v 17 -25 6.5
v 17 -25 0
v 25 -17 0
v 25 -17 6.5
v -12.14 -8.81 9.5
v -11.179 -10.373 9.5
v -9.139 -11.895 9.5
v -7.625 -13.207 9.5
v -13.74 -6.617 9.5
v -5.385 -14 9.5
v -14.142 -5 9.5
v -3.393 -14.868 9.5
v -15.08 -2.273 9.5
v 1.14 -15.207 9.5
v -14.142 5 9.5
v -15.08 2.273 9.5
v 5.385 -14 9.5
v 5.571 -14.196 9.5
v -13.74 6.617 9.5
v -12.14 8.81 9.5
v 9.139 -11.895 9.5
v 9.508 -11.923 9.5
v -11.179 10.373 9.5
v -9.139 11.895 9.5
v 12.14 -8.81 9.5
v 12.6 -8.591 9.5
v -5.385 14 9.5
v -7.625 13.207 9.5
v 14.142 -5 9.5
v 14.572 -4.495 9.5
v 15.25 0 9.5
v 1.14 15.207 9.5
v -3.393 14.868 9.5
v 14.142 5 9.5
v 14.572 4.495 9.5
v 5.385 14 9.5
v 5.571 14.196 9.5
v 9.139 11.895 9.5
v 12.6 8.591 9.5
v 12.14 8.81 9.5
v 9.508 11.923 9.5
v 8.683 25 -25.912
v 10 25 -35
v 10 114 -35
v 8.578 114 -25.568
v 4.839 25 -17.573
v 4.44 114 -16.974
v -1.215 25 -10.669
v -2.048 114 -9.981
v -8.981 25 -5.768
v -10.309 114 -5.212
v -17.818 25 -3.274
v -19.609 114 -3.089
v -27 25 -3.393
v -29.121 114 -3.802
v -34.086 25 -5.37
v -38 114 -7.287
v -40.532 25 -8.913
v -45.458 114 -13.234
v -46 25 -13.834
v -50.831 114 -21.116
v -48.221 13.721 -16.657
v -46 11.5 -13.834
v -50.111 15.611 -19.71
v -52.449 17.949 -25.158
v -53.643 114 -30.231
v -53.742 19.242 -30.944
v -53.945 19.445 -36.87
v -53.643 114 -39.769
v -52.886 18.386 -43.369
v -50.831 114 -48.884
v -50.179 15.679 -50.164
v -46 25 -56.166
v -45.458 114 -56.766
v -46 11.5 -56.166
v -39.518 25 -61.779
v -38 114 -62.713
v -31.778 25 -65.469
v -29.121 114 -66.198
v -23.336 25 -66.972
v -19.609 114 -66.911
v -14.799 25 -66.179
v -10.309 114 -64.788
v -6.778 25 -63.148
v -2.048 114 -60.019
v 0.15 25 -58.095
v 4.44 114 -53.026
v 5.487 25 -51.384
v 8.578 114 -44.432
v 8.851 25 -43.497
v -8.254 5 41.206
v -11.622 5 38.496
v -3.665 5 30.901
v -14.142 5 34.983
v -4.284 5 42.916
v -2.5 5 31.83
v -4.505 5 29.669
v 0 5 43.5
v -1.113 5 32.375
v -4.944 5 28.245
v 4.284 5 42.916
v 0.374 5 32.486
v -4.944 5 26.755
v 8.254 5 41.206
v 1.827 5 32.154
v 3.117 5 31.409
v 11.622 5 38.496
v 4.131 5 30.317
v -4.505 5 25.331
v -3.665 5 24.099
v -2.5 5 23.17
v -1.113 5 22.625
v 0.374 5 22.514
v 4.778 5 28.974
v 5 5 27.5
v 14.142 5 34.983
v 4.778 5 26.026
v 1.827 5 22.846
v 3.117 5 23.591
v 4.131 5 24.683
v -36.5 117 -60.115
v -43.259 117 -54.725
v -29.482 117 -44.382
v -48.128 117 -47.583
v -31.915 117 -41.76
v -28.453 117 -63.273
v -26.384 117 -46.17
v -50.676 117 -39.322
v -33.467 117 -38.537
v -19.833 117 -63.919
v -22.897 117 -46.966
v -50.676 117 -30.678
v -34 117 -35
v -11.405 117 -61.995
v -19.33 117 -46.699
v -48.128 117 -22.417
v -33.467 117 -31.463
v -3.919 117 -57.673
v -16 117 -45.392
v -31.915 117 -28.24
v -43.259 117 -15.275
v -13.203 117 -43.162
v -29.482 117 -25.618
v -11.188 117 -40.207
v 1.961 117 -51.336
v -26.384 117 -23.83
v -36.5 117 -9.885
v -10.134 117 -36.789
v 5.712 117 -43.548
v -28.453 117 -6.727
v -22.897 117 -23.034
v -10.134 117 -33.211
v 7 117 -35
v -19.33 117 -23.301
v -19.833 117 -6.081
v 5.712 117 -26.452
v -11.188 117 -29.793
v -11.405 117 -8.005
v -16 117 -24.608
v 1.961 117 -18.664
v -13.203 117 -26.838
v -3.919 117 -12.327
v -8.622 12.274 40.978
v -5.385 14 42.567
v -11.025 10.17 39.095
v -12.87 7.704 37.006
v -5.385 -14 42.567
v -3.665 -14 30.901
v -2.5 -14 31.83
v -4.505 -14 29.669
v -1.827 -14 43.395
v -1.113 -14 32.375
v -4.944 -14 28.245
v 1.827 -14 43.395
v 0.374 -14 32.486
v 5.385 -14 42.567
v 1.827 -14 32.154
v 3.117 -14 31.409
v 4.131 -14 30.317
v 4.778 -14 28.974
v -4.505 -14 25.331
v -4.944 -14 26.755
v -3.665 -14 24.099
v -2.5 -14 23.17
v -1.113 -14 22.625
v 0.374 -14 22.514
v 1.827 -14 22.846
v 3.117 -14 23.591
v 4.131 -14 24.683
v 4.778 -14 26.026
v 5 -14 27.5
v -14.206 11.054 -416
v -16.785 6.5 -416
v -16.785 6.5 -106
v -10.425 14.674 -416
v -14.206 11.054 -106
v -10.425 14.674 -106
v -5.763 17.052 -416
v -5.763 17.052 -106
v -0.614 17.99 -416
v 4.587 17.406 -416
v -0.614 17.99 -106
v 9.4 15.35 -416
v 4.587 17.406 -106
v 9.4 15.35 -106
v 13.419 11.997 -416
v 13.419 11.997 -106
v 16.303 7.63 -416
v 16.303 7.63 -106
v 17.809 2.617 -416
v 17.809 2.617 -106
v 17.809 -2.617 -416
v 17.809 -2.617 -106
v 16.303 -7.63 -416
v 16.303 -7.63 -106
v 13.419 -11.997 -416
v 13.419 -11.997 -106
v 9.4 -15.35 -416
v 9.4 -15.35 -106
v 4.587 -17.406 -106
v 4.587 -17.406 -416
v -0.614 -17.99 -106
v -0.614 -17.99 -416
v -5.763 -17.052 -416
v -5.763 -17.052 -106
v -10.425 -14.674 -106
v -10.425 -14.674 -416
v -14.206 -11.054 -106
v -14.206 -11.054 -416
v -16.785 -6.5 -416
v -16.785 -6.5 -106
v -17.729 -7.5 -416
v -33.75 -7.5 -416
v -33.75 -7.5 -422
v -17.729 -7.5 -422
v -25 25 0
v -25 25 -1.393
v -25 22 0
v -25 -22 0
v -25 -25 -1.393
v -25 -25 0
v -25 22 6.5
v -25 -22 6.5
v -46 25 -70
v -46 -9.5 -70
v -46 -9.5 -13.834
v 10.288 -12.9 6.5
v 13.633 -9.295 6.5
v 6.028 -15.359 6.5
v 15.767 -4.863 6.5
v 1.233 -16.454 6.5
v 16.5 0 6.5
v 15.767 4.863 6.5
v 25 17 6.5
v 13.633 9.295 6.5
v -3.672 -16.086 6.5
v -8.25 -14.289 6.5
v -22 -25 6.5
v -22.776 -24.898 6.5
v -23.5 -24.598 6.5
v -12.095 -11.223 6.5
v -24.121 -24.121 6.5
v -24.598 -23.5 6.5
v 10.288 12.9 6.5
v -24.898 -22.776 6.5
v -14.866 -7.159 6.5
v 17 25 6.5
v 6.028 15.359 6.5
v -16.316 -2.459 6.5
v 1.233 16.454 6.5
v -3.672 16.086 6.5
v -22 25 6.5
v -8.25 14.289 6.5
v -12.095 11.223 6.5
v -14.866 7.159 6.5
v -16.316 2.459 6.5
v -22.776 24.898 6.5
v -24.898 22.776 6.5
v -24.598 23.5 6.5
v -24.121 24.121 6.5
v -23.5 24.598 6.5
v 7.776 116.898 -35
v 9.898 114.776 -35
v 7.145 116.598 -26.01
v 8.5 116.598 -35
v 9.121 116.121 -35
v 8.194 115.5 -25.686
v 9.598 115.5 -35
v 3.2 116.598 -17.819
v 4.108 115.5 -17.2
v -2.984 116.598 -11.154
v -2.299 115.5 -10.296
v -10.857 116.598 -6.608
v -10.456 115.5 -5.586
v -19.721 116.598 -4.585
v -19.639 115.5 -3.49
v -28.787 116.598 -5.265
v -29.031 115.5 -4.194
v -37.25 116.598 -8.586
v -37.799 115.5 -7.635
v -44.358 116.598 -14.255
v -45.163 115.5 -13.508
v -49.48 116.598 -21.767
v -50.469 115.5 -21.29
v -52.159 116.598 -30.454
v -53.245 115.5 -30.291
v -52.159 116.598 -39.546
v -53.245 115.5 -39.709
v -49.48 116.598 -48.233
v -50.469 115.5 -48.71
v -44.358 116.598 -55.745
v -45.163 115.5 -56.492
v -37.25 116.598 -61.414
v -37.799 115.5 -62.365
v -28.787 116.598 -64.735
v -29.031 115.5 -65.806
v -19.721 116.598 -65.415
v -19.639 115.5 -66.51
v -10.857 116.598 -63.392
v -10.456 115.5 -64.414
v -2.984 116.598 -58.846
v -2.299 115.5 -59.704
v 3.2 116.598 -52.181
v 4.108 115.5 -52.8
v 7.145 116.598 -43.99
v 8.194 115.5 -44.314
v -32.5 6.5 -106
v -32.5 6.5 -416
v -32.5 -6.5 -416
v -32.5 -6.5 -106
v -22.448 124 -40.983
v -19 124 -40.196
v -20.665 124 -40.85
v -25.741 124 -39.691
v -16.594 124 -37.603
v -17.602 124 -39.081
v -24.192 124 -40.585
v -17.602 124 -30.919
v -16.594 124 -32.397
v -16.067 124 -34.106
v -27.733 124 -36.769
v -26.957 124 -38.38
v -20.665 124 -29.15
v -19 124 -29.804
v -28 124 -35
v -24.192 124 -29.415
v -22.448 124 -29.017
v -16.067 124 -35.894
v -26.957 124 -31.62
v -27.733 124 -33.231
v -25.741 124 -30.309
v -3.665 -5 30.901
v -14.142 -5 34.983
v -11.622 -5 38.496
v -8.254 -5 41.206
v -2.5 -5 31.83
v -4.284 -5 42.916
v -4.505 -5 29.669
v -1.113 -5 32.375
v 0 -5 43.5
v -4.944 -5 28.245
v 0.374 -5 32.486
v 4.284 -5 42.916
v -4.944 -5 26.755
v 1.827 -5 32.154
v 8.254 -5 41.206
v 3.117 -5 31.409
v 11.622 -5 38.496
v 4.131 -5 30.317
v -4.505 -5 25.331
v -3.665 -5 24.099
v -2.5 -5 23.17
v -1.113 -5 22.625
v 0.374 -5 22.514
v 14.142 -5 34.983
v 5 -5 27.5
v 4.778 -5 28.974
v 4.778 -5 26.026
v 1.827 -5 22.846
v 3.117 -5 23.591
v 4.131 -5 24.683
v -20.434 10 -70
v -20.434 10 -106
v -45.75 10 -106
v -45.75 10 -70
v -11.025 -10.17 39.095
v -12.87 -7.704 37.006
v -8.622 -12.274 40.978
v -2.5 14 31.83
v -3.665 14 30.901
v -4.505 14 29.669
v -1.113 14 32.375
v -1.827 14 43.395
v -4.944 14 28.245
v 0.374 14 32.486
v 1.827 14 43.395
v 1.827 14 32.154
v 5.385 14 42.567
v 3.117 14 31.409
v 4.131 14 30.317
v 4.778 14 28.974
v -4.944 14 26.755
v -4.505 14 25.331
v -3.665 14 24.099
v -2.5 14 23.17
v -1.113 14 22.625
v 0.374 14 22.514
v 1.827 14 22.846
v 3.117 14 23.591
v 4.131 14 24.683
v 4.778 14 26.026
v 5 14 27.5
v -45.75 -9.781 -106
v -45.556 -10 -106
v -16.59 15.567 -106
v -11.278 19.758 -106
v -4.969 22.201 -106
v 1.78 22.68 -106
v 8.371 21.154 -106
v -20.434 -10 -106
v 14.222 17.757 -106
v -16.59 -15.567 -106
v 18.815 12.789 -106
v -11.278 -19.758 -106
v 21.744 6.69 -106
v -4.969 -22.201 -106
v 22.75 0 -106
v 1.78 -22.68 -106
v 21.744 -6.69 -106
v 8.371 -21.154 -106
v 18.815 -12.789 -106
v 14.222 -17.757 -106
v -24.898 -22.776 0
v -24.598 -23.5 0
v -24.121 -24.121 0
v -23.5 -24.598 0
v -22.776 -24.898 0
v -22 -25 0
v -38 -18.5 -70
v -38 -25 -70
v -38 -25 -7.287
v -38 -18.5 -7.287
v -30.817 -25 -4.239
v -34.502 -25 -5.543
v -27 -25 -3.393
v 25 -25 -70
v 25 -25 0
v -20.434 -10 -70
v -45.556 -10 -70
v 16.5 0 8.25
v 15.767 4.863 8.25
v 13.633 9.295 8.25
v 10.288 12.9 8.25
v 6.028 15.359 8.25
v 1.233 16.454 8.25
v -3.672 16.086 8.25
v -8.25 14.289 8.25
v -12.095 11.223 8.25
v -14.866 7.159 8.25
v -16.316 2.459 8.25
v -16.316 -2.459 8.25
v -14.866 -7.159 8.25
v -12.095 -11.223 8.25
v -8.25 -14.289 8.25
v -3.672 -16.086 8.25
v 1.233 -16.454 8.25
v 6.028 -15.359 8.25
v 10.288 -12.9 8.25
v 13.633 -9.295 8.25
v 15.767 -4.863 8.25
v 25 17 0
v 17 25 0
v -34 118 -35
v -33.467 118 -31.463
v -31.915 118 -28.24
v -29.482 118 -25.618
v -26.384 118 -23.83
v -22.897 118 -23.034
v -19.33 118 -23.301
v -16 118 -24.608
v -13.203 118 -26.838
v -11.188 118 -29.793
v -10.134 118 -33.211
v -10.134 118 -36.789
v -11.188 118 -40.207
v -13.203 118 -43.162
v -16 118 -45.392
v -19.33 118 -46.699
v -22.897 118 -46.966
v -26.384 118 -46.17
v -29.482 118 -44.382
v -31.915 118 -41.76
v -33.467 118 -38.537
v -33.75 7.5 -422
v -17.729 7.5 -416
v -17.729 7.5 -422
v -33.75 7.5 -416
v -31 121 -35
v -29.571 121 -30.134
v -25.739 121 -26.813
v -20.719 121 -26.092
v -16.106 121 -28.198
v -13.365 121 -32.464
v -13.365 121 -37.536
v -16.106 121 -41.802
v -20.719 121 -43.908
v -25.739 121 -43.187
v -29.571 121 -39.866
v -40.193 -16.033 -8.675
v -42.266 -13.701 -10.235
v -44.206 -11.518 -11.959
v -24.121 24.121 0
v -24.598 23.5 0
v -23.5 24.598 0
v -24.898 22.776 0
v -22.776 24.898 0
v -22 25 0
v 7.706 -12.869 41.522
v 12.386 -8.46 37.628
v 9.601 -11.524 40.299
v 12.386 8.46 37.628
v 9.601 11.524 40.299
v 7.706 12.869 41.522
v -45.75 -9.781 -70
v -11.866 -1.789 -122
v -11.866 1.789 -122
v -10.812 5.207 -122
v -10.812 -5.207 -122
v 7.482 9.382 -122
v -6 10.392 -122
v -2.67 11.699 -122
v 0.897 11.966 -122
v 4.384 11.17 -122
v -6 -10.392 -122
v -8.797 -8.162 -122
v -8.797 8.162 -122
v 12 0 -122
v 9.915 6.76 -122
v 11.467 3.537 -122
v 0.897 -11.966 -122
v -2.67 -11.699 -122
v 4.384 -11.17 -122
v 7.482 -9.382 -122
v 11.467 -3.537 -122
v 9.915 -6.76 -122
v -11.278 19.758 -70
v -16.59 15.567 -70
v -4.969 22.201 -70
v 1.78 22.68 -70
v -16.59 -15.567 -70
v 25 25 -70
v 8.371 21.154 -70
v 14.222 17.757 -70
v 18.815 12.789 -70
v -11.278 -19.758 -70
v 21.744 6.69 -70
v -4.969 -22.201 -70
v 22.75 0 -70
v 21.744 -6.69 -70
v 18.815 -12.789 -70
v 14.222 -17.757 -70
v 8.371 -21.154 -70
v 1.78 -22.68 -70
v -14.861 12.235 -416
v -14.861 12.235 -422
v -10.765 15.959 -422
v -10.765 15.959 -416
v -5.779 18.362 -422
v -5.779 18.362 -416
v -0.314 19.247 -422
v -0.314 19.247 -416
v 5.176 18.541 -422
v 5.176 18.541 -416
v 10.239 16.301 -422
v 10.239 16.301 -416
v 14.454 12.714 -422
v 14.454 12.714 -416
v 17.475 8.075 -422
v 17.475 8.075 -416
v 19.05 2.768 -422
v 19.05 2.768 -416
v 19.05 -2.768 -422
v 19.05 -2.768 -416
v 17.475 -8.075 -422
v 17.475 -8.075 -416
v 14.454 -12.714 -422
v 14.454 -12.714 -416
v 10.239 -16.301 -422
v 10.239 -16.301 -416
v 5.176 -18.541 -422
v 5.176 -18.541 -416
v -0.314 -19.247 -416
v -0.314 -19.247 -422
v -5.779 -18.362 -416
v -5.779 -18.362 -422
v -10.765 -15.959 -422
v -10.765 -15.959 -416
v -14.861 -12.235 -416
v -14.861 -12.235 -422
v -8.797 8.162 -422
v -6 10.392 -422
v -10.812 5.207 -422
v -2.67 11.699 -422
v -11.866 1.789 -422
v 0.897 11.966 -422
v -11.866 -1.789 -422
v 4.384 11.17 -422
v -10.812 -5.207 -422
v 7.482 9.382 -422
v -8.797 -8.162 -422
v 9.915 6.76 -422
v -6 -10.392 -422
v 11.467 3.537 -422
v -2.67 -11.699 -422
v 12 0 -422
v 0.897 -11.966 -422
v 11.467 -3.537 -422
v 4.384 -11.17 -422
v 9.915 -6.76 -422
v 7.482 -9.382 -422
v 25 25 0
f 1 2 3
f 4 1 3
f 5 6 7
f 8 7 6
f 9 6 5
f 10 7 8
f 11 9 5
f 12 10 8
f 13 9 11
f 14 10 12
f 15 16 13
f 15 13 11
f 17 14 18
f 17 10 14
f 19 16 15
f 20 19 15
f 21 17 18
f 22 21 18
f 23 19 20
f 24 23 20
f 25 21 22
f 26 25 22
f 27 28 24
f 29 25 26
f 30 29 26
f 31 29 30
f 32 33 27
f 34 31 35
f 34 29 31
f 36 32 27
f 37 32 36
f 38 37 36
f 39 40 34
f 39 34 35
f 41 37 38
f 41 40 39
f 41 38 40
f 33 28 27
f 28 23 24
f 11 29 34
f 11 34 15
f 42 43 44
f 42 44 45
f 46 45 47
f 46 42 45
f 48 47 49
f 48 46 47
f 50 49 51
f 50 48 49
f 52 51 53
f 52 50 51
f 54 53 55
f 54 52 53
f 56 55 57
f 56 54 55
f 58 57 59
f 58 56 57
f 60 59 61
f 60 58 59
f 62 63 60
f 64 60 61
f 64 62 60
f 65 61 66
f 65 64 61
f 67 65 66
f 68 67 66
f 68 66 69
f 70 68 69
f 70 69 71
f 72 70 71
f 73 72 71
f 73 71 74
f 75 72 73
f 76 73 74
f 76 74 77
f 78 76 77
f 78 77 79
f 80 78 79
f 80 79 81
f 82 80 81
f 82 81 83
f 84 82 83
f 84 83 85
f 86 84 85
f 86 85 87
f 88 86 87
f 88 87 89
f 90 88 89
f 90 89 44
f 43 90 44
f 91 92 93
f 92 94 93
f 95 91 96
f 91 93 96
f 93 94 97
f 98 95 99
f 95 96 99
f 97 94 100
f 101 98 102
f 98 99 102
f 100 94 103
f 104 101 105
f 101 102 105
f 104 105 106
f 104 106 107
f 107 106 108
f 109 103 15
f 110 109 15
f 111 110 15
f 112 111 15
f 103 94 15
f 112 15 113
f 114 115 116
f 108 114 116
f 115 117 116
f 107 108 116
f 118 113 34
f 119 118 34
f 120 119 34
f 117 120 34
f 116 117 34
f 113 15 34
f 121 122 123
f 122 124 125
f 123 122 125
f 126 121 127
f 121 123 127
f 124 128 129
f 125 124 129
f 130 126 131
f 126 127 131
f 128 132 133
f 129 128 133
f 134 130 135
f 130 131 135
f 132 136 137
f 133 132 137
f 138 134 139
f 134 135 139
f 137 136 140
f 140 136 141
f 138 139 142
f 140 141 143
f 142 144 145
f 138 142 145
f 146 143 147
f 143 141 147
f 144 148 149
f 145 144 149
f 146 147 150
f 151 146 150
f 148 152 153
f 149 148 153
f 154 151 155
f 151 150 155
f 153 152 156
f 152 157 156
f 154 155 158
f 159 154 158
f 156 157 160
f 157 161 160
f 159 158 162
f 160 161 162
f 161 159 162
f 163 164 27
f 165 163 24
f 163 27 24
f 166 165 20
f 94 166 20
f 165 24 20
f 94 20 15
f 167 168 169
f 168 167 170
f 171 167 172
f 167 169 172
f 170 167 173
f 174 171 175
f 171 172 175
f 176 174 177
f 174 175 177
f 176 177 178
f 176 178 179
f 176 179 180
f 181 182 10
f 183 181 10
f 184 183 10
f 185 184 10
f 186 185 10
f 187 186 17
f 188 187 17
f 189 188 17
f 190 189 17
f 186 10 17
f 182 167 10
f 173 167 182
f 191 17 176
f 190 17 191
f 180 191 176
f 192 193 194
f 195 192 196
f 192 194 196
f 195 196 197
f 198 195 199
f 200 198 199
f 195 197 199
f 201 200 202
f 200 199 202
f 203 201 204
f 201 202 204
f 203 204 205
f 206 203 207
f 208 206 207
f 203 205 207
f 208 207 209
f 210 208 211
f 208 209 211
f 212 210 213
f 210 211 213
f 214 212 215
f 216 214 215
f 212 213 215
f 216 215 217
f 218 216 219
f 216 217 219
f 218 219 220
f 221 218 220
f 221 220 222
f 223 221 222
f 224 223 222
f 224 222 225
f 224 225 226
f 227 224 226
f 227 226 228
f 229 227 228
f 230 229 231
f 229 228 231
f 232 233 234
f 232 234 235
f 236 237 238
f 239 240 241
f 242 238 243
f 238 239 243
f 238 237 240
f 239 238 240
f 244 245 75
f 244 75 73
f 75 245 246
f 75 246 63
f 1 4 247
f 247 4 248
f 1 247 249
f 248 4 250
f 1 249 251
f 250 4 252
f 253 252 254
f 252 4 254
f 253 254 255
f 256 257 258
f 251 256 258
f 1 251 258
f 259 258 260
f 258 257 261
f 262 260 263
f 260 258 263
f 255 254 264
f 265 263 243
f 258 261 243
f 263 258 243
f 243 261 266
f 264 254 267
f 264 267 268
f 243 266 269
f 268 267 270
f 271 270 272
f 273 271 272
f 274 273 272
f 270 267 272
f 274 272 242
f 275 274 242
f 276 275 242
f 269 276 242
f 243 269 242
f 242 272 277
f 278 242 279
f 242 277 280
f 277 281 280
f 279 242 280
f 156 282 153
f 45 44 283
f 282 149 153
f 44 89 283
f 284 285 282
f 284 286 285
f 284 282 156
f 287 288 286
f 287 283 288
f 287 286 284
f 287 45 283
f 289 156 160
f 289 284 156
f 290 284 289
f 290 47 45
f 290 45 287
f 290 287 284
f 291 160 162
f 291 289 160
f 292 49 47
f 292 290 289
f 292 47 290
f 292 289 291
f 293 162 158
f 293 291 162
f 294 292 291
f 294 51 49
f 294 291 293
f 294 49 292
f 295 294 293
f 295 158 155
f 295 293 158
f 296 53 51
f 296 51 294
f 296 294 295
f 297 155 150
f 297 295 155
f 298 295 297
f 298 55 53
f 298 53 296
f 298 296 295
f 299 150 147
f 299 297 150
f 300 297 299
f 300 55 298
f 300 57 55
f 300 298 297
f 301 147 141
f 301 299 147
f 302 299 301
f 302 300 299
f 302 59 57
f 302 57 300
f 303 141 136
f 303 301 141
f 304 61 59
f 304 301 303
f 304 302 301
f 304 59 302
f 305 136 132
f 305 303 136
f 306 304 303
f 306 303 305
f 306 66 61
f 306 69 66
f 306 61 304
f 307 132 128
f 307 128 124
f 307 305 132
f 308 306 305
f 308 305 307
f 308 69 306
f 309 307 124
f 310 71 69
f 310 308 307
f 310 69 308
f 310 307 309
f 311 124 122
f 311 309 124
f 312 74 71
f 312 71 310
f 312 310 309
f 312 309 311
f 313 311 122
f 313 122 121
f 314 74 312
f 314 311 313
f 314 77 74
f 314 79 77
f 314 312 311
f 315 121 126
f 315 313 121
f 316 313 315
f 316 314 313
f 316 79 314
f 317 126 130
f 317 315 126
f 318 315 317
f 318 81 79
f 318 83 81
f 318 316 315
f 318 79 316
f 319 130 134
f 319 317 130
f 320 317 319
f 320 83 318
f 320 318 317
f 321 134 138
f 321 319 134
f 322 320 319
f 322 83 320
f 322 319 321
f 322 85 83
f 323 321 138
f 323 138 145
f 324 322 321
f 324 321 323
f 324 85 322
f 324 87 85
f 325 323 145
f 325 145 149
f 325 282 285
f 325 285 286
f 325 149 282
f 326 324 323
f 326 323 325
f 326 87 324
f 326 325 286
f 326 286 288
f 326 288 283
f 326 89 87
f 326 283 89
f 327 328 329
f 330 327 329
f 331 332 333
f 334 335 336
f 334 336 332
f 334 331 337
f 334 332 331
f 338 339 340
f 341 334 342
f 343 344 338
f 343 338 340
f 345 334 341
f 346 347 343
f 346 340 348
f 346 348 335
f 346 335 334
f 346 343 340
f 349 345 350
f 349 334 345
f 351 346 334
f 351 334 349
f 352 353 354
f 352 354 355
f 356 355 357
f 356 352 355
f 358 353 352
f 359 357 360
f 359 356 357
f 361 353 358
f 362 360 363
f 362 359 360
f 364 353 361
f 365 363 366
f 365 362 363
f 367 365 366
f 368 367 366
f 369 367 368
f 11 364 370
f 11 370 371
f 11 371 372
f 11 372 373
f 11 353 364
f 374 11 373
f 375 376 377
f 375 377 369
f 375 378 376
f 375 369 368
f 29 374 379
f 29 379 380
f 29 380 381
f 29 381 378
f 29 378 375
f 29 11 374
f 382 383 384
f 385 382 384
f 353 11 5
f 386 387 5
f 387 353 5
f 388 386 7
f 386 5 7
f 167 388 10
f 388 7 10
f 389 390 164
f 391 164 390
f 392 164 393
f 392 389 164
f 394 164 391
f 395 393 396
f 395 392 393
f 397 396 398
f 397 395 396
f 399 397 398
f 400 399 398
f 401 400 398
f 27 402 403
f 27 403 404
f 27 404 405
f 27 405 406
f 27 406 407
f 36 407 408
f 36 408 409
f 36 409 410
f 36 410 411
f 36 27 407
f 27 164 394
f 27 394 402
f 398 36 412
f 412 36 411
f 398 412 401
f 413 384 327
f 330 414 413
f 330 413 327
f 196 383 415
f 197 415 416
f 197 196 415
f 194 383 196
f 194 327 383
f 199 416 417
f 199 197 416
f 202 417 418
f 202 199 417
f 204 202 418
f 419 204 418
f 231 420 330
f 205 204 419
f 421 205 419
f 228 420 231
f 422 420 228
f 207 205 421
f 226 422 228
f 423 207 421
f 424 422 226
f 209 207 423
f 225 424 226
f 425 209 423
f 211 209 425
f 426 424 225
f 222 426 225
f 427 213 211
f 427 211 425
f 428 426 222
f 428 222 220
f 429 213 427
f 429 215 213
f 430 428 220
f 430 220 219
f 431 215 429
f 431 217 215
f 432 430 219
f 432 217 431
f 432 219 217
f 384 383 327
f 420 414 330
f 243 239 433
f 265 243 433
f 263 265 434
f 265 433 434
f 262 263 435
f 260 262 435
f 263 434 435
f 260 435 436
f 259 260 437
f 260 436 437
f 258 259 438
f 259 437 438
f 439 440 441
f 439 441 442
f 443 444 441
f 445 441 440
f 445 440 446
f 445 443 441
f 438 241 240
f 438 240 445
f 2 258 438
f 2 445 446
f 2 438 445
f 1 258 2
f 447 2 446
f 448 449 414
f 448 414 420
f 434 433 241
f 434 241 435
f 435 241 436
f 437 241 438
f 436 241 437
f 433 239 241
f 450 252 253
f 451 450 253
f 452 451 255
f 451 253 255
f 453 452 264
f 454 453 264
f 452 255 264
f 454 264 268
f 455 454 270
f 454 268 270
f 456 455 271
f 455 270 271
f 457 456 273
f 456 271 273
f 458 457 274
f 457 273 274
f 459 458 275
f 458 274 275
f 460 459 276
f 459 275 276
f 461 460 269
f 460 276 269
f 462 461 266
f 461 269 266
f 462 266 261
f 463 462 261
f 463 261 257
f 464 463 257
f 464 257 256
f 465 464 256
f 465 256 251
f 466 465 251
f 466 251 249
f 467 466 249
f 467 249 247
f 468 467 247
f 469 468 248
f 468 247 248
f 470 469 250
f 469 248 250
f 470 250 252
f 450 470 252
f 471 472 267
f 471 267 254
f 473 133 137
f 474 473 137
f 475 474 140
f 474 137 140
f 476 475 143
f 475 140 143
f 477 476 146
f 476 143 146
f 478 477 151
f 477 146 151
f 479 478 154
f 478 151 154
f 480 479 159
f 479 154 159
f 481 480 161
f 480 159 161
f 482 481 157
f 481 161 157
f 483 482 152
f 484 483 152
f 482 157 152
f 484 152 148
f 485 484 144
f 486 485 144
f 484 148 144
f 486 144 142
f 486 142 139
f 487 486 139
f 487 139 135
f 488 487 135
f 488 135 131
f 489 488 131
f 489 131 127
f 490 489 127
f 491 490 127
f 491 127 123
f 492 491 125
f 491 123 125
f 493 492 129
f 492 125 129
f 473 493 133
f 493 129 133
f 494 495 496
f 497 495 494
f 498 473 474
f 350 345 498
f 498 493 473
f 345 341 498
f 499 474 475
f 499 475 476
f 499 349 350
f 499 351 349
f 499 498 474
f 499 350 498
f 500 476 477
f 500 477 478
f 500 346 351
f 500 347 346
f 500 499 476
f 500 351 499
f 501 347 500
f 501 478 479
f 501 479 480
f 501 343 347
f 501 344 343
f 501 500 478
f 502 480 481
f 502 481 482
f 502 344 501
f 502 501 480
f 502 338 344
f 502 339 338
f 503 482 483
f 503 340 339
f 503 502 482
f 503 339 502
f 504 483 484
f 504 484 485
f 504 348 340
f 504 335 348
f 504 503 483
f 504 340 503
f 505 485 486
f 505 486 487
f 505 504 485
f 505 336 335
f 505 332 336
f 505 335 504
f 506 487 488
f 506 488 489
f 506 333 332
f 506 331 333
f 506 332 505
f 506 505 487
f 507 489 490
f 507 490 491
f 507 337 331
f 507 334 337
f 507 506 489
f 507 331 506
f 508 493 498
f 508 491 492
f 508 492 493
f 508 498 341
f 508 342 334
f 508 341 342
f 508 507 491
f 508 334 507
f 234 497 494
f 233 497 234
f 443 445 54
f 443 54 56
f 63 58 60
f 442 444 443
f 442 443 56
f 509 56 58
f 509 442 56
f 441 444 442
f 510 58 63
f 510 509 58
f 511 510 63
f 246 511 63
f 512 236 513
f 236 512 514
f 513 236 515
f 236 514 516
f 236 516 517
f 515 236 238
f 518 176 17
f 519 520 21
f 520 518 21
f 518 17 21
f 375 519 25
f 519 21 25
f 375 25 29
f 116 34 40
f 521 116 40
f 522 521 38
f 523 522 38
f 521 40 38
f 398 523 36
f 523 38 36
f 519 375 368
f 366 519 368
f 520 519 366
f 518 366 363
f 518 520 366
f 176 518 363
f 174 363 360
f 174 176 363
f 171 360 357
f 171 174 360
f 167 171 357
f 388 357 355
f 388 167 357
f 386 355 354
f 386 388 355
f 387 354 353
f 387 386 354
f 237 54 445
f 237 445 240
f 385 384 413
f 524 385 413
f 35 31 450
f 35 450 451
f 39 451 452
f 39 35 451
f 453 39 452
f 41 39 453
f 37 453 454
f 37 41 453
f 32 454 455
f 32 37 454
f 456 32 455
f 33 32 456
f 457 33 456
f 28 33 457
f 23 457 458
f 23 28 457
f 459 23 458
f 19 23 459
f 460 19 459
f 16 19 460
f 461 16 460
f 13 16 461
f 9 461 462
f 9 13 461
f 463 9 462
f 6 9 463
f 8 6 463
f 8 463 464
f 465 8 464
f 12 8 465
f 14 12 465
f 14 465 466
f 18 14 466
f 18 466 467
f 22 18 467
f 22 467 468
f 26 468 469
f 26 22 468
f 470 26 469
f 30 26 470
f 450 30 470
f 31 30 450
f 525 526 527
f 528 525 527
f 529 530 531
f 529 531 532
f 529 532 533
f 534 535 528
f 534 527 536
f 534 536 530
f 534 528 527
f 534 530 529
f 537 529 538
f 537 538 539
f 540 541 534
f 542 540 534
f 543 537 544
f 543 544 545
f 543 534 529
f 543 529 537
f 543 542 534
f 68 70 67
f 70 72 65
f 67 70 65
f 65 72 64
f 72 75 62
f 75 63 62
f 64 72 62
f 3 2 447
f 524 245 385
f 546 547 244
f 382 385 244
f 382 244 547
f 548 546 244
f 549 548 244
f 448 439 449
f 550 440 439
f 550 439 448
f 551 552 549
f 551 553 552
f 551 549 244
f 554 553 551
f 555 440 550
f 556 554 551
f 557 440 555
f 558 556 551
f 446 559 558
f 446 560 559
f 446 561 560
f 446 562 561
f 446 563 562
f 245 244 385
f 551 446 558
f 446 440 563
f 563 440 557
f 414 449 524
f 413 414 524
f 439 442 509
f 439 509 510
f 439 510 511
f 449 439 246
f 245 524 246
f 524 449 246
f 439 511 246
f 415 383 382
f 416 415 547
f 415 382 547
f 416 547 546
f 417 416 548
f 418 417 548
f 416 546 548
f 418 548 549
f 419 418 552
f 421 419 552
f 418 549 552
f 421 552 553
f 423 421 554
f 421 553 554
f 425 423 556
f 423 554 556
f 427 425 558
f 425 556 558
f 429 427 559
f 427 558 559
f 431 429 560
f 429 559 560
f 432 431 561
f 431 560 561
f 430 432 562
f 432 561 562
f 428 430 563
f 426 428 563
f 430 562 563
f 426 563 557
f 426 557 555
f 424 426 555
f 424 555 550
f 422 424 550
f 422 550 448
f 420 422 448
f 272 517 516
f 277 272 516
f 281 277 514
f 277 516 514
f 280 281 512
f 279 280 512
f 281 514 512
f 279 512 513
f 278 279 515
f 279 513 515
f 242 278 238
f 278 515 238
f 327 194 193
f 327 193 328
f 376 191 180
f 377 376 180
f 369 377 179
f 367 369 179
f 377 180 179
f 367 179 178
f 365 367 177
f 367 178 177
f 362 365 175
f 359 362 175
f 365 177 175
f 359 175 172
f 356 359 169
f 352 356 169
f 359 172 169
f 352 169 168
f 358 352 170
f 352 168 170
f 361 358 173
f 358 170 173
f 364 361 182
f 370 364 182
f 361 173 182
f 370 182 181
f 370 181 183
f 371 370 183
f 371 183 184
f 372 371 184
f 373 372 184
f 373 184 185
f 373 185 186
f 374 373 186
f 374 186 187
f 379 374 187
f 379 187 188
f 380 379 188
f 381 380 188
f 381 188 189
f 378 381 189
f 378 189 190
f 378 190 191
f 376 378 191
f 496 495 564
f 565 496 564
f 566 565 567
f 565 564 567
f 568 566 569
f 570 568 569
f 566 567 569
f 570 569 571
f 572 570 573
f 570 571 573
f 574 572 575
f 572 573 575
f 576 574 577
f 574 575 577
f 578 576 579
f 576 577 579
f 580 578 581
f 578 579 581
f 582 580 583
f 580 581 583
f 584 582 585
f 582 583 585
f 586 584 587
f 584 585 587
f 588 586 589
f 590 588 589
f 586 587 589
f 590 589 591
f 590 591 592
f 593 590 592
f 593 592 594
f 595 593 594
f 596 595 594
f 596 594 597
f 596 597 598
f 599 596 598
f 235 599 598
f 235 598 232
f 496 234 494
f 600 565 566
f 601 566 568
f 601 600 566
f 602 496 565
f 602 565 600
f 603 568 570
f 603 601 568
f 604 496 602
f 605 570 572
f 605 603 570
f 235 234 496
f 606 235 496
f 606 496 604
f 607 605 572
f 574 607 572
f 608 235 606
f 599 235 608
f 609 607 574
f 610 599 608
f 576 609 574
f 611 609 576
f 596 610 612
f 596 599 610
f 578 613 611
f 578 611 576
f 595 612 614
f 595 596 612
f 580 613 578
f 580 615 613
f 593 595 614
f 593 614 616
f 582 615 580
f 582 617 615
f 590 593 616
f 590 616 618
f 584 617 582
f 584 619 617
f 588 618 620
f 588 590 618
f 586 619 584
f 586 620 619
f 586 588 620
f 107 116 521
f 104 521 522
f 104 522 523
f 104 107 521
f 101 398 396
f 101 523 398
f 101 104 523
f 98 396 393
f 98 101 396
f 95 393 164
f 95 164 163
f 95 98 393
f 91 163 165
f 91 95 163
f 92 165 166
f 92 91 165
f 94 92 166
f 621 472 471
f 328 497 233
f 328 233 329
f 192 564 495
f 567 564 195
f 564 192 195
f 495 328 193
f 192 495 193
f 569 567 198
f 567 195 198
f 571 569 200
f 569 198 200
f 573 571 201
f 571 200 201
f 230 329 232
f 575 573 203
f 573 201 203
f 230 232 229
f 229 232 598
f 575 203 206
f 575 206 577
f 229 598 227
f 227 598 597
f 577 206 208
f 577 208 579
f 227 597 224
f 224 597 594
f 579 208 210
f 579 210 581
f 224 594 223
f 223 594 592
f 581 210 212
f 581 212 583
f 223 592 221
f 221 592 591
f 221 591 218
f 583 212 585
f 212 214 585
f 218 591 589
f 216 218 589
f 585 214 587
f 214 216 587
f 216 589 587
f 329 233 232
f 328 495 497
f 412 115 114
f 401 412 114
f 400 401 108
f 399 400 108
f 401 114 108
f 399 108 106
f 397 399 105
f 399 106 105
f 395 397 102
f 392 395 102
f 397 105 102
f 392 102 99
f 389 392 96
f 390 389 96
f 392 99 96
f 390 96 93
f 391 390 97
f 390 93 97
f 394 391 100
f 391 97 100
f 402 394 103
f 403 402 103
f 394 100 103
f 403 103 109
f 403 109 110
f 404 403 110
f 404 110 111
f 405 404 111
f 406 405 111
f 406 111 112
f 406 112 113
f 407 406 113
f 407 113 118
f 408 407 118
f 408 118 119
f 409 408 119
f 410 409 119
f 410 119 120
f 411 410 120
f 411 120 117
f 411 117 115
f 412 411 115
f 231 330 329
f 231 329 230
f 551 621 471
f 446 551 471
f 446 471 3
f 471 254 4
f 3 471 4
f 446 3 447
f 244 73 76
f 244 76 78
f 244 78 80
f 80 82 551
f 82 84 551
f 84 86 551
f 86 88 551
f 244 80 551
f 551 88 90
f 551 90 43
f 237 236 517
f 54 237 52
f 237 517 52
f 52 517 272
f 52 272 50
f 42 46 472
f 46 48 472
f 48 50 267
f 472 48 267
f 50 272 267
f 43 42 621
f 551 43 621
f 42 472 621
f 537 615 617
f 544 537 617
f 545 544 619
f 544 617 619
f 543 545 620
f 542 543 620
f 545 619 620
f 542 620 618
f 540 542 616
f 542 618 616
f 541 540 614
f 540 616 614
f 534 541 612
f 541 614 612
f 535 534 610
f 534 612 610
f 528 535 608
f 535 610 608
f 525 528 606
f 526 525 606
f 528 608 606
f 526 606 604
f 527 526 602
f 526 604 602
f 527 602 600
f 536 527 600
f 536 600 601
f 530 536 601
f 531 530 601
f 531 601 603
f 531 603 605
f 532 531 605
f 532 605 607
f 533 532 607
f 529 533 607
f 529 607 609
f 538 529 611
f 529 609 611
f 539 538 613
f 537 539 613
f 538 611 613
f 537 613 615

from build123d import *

# Parameters (mm, degrees)
PAD_DEPTH       = 6.5
SKETCH001_R     = 16.5
PAD001_DEPTH    = 3
PAD002_DEPTH    = 34
SKETCH003_R     = 5
POCKET_DEPTH    = 30
CHAMFER_SIZE    = 1.25
SKETCH004_W     = 71
SKETCH004_H     = 50
PAD003_DEPTH    = 70
SKETCH005_R     = 32
PAD004_DEPTH    = 142
PAD005_DEPTH    = 36
PAD006_DEPTH    = 310
PAD007_DEPTH    = 6
POCKET001_DEPTH = 142.001
POCKET002_DEPTH = 422.001
SKETCH011_R     = 12
POCKET003_DEPTH = 300
SKETCH012_R     = 12
PAD008_DEPTH    = 7
CHAMFER001_SIZE = 6
FILLET_R        = 3


with BuildPart() as part:
    # Sketch → Pad (new body)
    with BuildSketch(Plane.XY):
        with BuildLine():
            Line((-22, 25), (17, 25))
            Line((17, 25), (25, 17))
            Line((25, 17), (25, -17))
            Line((17, -25), (25, -17))
            Line((17, -25), (-22, -25))
            ThreePointArc((-25, -22), (-24.12132, -24.12132), (-22, -25))
            Line((-25, -22), (-25, 22))
            ThreePointArc((-22, 25), (-24.12132, 24.12132), (-25, 22))
        make_face()
    extrude(amount=PAD_DEPTH)

    # Sketch001 (on Face10 of Pad) → Pad001 (join)
    with BuildSketch(Plane.XY.offset(6.5)):
        Circle(SKETCH001_R)
    extrude(amount=PAD001_DEPTH)

    # Sketch002 (on Face12 of Pad001) → Pad002 (join)
    with BuildSketch(Plane.XY.offset(9.5)):
        with BuildLine():
            ThreePointArc((-5.385165, 14), (-10.750761, 10.460456), (-14.142136, 5))
            Line((-14.142136, 5), (14.142136, 5))
            ThreePointArc((14.142136, 5), (10.750761, 10.460456), (5.385165, 14))
            Line((-5.385165, 14), (5.385165, 14))
        make_face()
        with BuildLine():
            Line((-14.142136, -5), (14.142136, -5))
            ThreePointArc((5.385165, -14), (10.750761, -10.460456), (14.142136, -5))
            Line((-5.385165, -14), (5.385165, -14))
            ThreePointArc((-14.142136, -5), (-10.750761, -10.460456), (-5.385165, -14))
        make_face()
    extrude(amount=PAD002_DEPTH)

    # Sketch003 (on Face14 of Pad002) → Pocket (cut)
    with BuildSketch(Plane.XZ.offset(14)):
        with Locations((0, 27.5)):
            Circle(SKETCH003_R)
        with BuildLine():
            ThreePointArc((14.387495, 34.5), (0, 43.5), (-14.387495, 34.5))
            Line((-14.387495, 34.5), (-14.387495, 44.5))
            Line((14.387495, 44.5), (-14.387495, 44.5))
            Line((14.387495, 34.5), (14.387495, 44.5))
        make_face()
    extrude(amount=-POCKET_DEPTH, mode=Mode.SUBTRACT)

    # Chamfer
    chamfer_edges = [part.edges().sort_by_distance(p)[0] for p in [
        (-16.5, 0, 9.5),
    ]]
    chamfer(chamfer_edges, length=CHAMFER_SIZE)

    # Sketch004 (on Face21 of Chamfer) → Pad003 (join)
    with BuildSketch(Plane(origin=(0, 0, 0), x_dir=(1, 0, 0), z_dir=(0, 0, -1))):
        with Locations((-10.5, 0)):
            Rectangle(SKETCH004_W, SKETCH004_H)
    extrude(amount=PAD003_DEPTH)

    # Sketch005 (on Face1 of Pad003) → Pad004 (join)
    with BuildSketch(Plane.XZ.offset(25)):
        with Locations((-22, -35)):
            Circle(SKETCH005_R)
    extrude(amount=-PAD004_DEPTH)

    # Sketch006 (on Face6 of Pad004) → Pad005 (join)
    with BuildSketch(Plane(origin=(0, 0, -70), x_dir=(1, 0, 0), z_dir=(0, 0, -1))):
        with BuildLine():
            ThreePointArc((-20.434346, -10), (22.75, 0), (-20.434346, 10))
            Line((-45.75, 10), (-20.434346, 10))
            Line((-45.75, -10), (-45.75, 10))
            Line((-20.434346, -10), (-45.75, -10))
        make_face()
    extrude(amount=PAD005_DEPTH)

    # Sketch007 (on Face27 of Pad005) → Pad006 (join)
    with BuildSketch(Plane(origin=(0, 0, -106), x_dir=(1, 0, 0), z_dir=(0, 0, -1))):
        with BuildLine():
            ThreePointArc((-16.78541, -6.5), (18, 0), (-16.78541, 6.5))
            Line((-32.5, 6.5), (-16.78541, 6.5))
            Line((-32.5, -6.5), (-32.5, 6.5))
            Line((-16.78541, -6.5), (-32.5, -6.5))
        make_face()
    extrude(amount=PAD006_DEPTH)

    # Sketch008 (on Face35 of Pad006) → Pad007 (join)
    with BuildSketch(Plane(origin=(0, 0, -416), x_dir=(1, 0, 0), z_dir=(0, 0, -1))):
        with BuildLine():
            ThreePointArc((-17.728861, -7.5), (19.25, 0), (-17.728861, 7.5))
            Line((-33.75, 7.5), (-17.728861, 7.5))
            Line((-33.75, -7.5), (-33.75, 7.5))
            Line((-17.728861, -7.5), (-33.75, -7.5))
        make_face()
    extrude(amount=PAD007_DEPTH)

    # Sketch009 (on Face1 of Pad003) → Pocket001 (cut, through all)
    with BuildSketch(Plane.XZ.offset(25)):
        with BuildLine():
            ThreePointArc((-27, -3.393039), (-46.33105, -14.21539), (-54, -35))
            Line((-54, -35), (-54, 0))
            Line((-25, 0), (-54, 0))
            Line((-25, -1.393039), (-25, 0))
            Line((-27, -3.393039), (-25, -1.393039))
        make_face()
    extrude(amount=-POCKET001_DEPTH, mode=Mode.SUBTRACT)

    # Sketch010 (on Face4 of Pad003) → Pocket002 (cut, through all)
    with BuildSketch(Plane.XY):
        Polygon((-38, -25), (-38, -18.5), (-46, -9.5), (-46, 11.5), (-55, 20.5), (-55, -25), align=None)
    extrude(amount=-POCKET002_DEPTH, mode=Mode.SUBTRACT)

    # Sketch011 (on Face5 of Pad007) → Pocket003 (cut)
    with BuildSketch(Plane(origin=(0, 0, -422), x_dir=(1, 0, 0), z_dir=(0, 0, -1))):
        Circle(SKETCH011_R)
    extrude(amount=-POCKET003_DEPTH, mode=Mode.SUBTRACT)

    # Sketch012 (on Face23 of Pad004) → Pad008 (join)
    with BuildSketch(Plane(origin=(0, 117, 0), x_dir=(-1, 0, 0), z_dir=(0, 1, 0))):
        with Locations((22, -35)):
            Circle(SKETCH012_R)
    extrude(amount=PAD008_DEPTH)

    # Chamfer001
    chamfer001_edges = [part.edges().sort_by_distance(p)[0] for p in [
        (-10, 124, -35),
    ]]
    chamfer(chamfer001_edges, length=CHAMFER001_SIZE)

    # Fillet
    fillet_edges = [part.edges().sort_by_distance(p)[0] for p in [
        (-46.33105, 117, -14.21539),
        (-1.21539, 117, -10.66895),
        (-22, 117, -67),
    ]]
    fillet(fillet_edges, radius=FILLET_R)


solid = part.part
